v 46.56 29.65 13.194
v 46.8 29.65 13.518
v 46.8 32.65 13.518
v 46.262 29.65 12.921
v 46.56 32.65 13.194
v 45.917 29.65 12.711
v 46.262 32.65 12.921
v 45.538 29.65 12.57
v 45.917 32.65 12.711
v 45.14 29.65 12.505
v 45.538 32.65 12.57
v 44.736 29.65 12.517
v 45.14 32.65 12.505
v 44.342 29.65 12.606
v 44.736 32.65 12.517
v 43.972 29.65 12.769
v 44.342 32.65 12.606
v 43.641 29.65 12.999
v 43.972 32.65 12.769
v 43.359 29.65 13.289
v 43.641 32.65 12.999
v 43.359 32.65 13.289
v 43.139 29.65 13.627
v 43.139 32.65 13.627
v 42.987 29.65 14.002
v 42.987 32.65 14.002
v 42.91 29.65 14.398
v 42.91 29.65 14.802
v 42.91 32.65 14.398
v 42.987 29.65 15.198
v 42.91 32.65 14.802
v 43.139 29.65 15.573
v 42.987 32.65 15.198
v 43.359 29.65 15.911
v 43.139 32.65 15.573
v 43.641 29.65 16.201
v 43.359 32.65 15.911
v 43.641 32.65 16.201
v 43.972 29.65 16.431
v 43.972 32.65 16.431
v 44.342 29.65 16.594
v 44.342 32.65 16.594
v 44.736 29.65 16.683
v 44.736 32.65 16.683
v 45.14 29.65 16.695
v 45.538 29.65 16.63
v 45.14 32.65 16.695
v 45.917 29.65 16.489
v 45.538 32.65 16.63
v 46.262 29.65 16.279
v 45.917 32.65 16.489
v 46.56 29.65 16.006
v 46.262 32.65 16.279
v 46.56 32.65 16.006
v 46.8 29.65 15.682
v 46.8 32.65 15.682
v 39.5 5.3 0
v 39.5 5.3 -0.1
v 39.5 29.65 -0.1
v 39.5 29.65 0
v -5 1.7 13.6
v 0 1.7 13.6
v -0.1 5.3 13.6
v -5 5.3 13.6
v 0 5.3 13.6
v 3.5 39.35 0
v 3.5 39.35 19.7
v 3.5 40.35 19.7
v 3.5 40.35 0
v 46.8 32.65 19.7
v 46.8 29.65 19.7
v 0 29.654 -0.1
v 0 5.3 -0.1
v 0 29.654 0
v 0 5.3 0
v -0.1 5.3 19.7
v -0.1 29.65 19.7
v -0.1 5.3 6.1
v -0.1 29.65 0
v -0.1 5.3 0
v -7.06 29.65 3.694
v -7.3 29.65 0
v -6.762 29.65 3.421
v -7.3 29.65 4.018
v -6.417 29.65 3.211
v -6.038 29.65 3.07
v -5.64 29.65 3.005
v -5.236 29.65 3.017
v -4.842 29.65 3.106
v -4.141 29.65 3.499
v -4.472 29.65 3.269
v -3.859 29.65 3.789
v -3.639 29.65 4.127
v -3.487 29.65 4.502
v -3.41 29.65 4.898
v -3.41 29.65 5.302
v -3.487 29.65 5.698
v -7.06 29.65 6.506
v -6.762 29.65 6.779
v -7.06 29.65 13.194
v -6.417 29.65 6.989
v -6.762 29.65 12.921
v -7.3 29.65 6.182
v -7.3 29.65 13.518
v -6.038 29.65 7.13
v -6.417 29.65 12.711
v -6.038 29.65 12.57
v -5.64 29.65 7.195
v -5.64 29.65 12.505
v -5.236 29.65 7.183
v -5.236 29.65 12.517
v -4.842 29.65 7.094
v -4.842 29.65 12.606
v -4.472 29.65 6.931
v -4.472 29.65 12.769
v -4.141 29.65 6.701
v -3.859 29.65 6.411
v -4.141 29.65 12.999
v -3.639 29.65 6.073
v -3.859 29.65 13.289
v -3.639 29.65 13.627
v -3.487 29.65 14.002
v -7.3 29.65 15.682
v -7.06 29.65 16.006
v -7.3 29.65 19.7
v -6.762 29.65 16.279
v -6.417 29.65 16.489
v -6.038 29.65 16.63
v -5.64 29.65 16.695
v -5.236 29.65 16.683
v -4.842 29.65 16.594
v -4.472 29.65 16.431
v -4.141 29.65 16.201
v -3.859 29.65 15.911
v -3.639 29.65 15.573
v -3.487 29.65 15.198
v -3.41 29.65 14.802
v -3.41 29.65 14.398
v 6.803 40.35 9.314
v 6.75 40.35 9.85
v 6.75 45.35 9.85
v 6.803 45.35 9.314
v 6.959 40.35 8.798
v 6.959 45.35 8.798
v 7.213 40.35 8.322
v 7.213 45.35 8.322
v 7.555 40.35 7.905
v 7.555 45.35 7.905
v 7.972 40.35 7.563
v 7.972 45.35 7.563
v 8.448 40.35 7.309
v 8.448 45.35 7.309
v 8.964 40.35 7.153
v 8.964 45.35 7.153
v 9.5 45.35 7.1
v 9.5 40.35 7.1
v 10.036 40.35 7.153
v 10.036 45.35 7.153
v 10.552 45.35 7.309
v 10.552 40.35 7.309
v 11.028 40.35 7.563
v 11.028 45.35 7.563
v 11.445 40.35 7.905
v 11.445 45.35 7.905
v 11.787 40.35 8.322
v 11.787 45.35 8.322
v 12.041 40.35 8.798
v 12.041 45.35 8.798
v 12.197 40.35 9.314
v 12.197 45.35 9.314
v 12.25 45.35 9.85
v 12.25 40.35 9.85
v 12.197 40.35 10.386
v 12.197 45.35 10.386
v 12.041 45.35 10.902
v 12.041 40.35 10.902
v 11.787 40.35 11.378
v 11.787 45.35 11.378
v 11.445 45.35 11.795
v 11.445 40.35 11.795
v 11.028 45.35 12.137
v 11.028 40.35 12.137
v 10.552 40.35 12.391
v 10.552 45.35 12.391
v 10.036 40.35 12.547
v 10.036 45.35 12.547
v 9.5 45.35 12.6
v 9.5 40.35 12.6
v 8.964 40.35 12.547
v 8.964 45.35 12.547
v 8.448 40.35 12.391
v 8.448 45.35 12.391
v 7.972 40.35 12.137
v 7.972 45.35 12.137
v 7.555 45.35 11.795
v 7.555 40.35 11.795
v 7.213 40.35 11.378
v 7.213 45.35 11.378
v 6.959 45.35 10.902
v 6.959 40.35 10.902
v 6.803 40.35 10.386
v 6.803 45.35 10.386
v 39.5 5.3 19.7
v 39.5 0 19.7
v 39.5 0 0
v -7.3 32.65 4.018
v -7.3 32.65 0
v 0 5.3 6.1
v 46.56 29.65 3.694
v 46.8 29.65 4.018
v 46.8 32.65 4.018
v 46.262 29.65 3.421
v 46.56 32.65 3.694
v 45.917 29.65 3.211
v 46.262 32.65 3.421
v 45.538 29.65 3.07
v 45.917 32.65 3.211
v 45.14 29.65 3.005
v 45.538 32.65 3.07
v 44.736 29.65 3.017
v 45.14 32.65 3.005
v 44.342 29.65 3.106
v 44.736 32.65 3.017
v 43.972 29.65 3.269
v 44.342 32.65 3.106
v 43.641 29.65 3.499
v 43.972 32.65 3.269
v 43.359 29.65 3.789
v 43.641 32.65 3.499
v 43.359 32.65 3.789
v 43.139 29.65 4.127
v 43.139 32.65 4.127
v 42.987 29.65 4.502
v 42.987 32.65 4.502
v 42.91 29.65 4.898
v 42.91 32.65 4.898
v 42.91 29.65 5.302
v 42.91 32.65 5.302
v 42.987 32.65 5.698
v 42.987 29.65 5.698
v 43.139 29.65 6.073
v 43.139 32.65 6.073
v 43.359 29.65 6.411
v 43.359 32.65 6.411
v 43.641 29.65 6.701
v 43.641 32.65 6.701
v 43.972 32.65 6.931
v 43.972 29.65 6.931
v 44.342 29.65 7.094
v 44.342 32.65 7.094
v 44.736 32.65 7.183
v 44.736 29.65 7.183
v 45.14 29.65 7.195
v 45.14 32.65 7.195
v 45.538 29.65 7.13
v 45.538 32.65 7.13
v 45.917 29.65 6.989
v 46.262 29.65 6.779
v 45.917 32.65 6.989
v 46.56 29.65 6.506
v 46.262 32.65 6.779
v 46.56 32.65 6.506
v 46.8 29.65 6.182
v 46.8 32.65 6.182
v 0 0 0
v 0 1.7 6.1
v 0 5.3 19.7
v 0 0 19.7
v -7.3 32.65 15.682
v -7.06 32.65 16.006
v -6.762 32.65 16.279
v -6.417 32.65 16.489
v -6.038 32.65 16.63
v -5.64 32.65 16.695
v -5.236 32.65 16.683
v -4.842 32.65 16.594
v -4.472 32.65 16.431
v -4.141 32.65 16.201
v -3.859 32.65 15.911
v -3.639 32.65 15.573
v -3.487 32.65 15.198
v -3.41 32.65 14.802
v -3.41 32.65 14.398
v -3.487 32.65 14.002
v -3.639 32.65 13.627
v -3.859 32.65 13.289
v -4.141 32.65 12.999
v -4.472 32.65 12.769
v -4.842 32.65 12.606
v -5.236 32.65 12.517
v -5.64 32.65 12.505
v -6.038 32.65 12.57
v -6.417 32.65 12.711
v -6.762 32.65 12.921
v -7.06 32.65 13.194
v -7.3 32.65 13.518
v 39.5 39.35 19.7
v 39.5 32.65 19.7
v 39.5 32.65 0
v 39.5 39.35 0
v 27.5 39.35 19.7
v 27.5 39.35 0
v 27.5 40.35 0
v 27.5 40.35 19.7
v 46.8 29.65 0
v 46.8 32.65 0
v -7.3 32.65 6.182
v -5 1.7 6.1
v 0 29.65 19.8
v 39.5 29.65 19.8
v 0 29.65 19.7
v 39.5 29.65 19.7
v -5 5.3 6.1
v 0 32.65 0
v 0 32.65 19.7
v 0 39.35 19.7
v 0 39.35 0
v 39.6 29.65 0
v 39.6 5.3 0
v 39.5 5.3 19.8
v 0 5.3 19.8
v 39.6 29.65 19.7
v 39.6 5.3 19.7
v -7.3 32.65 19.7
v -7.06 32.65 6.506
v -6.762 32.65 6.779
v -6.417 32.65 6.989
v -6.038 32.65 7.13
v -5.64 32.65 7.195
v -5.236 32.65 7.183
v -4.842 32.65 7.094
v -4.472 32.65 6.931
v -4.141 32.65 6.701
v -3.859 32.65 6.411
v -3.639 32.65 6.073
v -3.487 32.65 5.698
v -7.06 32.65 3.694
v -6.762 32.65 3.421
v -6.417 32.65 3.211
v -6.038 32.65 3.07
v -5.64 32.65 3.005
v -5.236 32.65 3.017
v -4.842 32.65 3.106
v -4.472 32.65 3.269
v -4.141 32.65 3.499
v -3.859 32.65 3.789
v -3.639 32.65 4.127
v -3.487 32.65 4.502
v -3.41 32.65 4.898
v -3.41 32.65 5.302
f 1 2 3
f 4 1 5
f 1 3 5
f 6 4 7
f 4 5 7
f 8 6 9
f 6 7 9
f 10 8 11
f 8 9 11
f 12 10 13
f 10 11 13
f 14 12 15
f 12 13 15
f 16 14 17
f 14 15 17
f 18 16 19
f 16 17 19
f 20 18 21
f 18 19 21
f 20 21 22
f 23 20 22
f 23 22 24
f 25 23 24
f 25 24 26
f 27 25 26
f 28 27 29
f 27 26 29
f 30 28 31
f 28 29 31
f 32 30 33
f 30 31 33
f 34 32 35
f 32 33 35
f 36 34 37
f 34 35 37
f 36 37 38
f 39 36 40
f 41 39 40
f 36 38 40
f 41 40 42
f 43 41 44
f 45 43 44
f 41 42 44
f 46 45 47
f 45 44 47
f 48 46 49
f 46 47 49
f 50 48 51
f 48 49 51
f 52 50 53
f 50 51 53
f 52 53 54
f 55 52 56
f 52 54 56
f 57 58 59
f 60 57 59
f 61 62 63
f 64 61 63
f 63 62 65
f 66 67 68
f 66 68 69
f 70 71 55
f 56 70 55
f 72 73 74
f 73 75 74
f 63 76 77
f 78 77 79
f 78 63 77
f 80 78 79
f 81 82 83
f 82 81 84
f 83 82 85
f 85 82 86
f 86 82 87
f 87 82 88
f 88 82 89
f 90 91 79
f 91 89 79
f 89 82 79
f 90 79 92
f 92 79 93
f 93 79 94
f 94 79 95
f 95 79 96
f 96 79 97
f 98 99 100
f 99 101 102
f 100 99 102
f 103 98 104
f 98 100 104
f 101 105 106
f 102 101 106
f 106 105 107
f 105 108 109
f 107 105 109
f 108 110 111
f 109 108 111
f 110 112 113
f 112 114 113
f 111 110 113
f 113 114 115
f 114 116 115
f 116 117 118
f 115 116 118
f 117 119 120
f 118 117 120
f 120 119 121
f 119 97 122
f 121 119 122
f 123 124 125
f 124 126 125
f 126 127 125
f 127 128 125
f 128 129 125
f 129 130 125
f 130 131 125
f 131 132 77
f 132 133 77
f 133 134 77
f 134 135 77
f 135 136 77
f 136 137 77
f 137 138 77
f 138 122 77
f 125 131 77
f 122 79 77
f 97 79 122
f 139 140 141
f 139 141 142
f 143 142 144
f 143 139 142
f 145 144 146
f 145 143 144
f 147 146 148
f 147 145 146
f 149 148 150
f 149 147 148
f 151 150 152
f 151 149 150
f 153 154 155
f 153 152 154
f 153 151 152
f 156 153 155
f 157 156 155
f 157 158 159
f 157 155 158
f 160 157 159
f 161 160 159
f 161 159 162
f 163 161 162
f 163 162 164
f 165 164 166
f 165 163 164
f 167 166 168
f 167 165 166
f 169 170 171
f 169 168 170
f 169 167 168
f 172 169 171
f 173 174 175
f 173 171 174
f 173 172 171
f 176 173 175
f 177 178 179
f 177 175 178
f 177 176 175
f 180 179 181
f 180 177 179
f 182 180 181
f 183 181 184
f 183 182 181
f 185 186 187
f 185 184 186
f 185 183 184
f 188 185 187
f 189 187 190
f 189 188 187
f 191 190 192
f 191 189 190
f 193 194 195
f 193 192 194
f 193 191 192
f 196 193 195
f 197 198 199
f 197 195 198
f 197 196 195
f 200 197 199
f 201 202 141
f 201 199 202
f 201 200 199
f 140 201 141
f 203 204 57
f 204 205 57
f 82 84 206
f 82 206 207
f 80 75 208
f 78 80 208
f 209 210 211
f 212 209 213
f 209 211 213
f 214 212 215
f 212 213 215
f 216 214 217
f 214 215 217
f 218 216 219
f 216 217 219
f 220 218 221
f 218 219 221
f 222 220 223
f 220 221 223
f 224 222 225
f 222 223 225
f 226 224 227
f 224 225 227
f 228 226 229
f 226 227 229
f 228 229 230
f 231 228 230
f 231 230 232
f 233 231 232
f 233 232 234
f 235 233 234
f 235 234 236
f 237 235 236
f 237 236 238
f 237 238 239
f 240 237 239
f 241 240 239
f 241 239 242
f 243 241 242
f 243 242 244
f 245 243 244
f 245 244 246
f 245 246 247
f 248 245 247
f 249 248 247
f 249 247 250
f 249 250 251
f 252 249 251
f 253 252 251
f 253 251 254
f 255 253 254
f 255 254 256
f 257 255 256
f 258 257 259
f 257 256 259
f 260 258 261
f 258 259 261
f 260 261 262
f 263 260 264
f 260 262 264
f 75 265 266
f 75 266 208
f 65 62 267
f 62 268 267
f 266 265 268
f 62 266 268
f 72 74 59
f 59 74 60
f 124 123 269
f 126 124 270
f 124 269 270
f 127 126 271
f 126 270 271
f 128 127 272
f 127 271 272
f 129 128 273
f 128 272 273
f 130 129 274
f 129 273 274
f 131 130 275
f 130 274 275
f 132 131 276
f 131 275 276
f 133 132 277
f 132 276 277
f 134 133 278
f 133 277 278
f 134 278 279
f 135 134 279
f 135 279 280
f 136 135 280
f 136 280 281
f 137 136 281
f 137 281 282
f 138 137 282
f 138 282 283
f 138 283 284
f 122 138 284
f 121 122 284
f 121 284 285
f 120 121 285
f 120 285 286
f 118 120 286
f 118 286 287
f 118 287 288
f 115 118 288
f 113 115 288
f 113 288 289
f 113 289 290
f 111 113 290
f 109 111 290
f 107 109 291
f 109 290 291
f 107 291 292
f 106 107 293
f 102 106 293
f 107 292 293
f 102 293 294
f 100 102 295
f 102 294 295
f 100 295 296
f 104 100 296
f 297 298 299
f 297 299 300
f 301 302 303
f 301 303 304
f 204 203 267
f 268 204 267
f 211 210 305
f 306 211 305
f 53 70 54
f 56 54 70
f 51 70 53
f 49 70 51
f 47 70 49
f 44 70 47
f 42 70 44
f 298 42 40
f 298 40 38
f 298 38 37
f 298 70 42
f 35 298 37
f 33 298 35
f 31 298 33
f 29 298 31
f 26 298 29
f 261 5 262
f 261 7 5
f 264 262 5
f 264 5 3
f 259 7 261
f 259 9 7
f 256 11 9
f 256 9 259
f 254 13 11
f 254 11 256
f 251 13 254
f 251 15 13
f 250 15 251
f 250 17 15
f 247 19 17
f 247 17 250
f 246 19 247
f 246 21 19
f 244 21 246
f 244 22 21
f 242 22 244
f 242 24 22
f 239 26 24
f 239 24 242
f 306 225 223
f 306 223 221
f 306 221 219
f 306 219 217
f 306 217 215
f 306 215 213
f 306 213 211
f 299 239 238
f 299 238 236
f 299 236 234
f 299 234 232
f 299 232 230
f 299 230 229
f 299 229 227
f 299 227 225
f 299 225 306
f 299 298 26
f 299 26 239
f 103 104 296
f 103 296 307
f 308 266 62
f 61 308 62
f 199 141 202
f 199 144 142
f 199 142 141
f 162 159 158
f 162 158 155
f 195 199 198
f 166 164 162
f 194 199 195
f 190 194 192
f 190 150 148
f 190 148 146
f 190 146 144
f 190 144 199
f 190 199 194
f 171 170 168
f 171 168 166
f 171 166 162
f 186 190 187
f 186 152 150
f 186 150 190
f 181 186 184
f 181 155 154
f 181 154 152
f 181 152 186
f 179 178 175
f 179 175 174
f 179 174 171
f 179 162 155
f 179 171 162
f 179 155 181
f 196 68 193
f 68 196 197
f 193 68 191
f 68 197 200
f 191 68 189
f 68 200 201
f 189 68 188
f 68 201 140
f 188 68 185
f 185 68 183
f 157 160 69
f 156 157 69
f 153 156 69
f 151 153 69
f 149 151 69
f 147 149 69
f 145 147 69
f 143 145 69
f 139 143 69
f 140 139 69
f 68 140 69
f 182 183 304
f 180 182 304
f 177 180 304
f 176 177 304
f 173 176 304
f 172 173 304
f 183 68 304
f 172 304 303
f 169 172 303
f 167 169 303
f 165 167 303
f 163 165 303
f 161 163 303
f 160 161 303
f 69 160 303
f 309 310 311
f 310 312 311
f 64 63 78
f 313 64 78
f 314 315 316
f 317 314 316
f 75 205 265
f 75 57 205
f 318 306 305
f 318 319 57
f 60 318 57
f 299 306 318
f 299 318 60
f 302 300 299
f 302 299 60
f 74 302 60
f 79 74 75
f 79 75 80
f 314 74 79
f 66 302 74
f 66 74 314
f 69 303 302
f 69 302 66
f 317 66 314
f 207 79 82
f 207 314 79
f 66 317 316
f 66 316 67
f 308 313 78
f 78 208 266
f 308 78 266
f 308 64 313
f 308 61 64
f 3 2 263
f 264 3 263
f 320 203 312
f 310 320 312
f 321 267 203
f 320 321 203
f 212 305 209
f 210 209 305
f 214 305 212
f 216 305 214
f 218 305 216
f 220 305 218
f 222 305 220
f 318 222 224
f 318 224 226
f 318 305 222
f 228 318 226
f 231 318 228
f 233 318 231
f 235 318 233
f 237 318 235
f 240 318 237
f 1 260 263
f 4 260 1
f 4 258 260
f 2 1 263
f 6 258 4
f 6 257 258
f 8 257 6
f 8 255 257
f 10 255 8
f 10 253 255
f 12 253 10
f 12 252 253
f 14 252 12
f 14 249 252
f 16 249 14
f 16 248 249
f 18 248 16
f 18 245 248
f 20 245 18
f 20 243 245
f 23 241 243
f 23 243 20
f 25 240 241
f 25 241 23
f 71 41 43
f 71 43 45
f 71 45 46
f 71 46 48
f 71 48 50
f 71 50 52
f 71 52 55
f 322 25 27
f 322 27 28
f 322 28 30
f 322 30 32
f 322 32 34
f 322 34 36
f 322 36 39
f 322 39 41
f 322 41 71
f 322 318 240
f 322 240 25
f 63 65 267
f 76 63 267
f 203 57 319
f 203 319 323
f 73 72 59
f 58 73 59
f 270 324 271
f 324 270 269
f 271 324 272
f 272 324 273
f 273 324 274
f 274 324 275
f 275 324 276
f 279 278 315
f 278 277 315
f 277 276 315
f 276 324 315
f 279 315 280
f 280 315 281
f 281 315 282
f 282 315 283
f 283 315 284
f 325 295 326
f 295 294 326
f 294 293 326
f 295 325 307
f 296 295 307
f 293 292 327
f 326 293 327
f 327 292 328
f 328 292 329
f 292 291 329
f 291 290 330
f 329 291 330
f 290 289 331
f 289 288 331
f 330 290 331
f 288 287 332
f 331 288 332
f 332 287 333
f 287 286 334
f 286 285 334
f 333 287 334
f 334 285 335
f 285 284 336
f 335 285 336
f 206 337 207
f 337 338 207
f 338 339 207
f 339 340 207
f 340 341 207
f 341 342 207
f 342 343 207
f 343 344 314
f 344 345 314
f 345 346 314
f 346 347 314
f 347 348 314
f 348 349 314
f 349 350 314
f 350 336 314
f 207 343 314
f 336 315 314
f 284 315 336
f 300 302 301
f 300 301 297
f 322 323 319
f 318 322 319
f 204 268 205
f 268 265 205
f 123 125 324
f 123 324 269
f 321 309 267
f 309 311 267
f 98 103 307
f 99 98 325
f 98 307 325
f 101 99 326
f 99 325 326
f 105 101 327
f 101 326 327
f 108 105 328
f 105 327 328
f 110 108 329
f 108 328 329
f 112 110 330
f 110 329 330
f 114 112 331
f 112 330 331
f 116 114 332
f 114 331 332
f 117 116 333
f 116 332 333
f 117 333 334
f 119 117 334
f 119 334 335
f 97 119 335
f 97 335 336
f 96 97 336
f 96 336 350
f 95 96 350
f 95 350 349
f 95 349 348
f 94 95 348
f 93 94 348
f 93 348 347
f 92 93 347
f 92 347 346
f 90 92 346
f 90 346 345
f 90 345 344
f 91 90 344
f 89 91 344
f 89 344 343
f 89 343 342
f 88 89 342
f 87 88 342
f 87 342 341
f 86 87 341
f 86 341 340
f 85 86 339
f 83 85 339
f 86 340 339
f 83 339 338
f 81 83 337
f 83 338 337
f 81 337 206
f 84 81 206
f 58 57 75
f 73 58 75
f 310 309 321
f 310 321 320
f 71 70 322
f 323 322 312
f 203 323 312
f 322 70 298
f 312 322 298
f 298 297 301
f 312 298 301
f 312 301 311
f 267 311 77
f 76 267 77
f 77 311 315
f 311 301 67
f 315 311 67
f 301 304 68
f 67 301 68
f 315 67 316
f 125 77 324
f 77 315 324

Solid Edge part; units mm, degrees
sketch "Sketch1" plane through (0, 0, 0) normal (0, 0, 1) x (1, 0, 0)
  line L0 (0, 39.35) -> (39.5, 39.35)
  line L1 (39.5, 0) -> (39.5, 39.35)
  line L2 (0, 0) -> (39.5, 0)
  line L3 (0, 0) -> (0, 39.35)
extrude "Protrusion1" add sketch "Sketch1" along normal blind 19.7
sketch "Sketch2" plane through (0, 19.675, 9.85) normal (-1, 0, 0) x (0, 0, 1)
  line L0 (0, 12.975) -> (-9.85, 12.975)
  line L1 (-9.85, 12.975) -> (-9.85, 9.975)
  line L2 (-9.85, 9.975) -> (9.85, 9.975)
  line L3 (9.85, 9.975) -> (9.85, 12.975)
  line L4 (9.85, 12.975) -> (0, 12.975)
extrude "ExtrudedProtrusion_2" add sketch "Sketch2" along normal blind 7.3
sketch "Sketch3" plane through (39.5, 19.675, 9.85) normal (1, 0, 0) x (0, 0, -1)
  line L0 (-9.85, 12.975) -> (9.85, 12.975)
  line L1 (9.85, 12.975) -> (9.85, 9.975)
  line L2 (9.85, 9.975) -> (-9.85, 9.975)
  line L3 (-9.85, 9.975) -> (-9.85, 12.975)
extrude "ExtrudedProtrusion_3" add sketch "Sketch3" along normal blind 7.3
sketch "Sketch4" plane through (19.75, 39.35, 9.85) normal (0, 1, 0) x (-1, 0, 0)
  line L0 (-7.75, 0) -> (-7.75, 9.85)
  line L1 (-7.75, 9.85) -> (16.25, 9.85)
  line L2 (16.25, 9.85) -> (16.25, -9.85)
  line L3 (16.25, -9.85) -> (-7.75, -9.85)
  line L4 (-7.75, -9.85) -> (-7.75, 0)
  dimension "D1" = 24
extrude "ExtrudedProtrusion_4" add sketch "Sketch4" along normal blind 1
sketch "Sketch5" plane through (15.5, 40.35, 9.85) normal (0, 1, 0) x (-1, 0, 0)
  circle A0 centre (6, 0) radius 2.75
  dimension "D1" = 5.5
extrude "ExtrudedProtrusion_5" add sketch "Sketch5" along normal blind 5
sketch "Sketch6" plane through (0, 14.825, 9.85) normal (-1, 0, 0) x (0, 0, 1)
  line L0 (-3.75, -13.125) -> (3.75, -13.125)
  line L1 (3.75, -13.125) -> (3.75, -9.525)
  line L2 (3.75, -9.525) -> (-3.75, -9.525)
  line L3 (-3.75, -9.525) -> (-3.75, -13.125)
  dimension "D1" = 7.5
  dimension "D2" = 3.6
extrude "ExtrudedProtrusion_6" add sketch "Sketch6" along normal blind 5
sketch "Sketch7" plane through (-3.65, 32.65, 9.85) normal (0, 1, 0) x (0, 0, 1)
  circle A0 centre (-4.75, -1.85) radius 2.1
  circle A1 centre (4.75, -1.85) radius 2.1
extrude "ExtrudedCutout_1" cut sketch "Sketch7" against normal blind 3.8617
sketch "Sketch8" plane through (43.15, 32.65, 9.85) normal (0, 1, 0) x (0, 0, -1)
  circle A0 centre (-4.75, -1.85) radius 2.1
  circle A1 centre (4.75, -1.85) radius 2.1
extrude "Cutout1" cut sketch "Sketch8" against normal up to vertex (3 mm away)
sketch "Sketch9" plane through (19.75, 20.175, 0) normal (0, 0, -1) x (-1, 0, 0)
  line L0 (18.9588, -14.875) -> (-19.75, -14.875)
  line L1 (-19.75, -14.875) -> (-19.75, 9.475)
  line L2 (19.75, 9.4794) -> (-19.75, 9.475)
  line L3 (19.75, -14.875) -> (19.75, 9.4794)
extrude "ExtrudedProtrusion_7" add sketch "Sketch9" along normal blind 0.1 material side at (20.1456, 5.25, 0)
sketch "Sketch10" plane through (0, 14.8272, 9.8) normal (-1, 0, 0) x (0, 0, 1)
  line L0 (-9.8, -9.5272) -> (9.9, -9.5272)
  line L1 (9.9, -9.5272) -> (9.9, 14.8228)
  line L2 (9.9, 14.8228) -> (-9.8, 14.8228)
  line L3 (-9.8, 14.8228) -> (-9.8, -9.5272)
extrude "ExtrudedProtrusion_8" add sketch "Sketch10" along normal blind 0.1
sketch "Sketch11" plane through (19.75, 20.175, 19.7) normal (0, 0, 1) x (1, 0, 0)
  line L0 (-19.75, 9.475) -> (-19.75, -14.875)
  line L1 (-19.75, -14.875) -> (19.75, -14.875)
  line L2 (19.75, -14.875) -> (19.75, 9.475)
  line L3 (19.75, 9.475) -> (-19.75, 9.475)
extrude "ExtrudedProtrusion_9" add sketch "Sketch11" along normal blind 0.1
sketch "Sketch12" plane through (39.5, 14.825, 9.85) normal (1, 0, 0) x (0, 0, -1)
  line L0 (-9.85, 14.825) -> (9.85, 14.825)
  line L1 (9.85, 14.825) -> (9.85, -9.525)
  line L2 (9.85, -9.525) -> (-9.85, -9.525)
  line L3 (-9.85, -9.525) -> (-9.85, 14.825)
extrude "ExtrudedProtrusion_10" add sketch "Sketch12" along normal blind 0.1
properties material "Aluminum Alloy:3.0255 , Al 99.5 , EN-AW 1050A"
